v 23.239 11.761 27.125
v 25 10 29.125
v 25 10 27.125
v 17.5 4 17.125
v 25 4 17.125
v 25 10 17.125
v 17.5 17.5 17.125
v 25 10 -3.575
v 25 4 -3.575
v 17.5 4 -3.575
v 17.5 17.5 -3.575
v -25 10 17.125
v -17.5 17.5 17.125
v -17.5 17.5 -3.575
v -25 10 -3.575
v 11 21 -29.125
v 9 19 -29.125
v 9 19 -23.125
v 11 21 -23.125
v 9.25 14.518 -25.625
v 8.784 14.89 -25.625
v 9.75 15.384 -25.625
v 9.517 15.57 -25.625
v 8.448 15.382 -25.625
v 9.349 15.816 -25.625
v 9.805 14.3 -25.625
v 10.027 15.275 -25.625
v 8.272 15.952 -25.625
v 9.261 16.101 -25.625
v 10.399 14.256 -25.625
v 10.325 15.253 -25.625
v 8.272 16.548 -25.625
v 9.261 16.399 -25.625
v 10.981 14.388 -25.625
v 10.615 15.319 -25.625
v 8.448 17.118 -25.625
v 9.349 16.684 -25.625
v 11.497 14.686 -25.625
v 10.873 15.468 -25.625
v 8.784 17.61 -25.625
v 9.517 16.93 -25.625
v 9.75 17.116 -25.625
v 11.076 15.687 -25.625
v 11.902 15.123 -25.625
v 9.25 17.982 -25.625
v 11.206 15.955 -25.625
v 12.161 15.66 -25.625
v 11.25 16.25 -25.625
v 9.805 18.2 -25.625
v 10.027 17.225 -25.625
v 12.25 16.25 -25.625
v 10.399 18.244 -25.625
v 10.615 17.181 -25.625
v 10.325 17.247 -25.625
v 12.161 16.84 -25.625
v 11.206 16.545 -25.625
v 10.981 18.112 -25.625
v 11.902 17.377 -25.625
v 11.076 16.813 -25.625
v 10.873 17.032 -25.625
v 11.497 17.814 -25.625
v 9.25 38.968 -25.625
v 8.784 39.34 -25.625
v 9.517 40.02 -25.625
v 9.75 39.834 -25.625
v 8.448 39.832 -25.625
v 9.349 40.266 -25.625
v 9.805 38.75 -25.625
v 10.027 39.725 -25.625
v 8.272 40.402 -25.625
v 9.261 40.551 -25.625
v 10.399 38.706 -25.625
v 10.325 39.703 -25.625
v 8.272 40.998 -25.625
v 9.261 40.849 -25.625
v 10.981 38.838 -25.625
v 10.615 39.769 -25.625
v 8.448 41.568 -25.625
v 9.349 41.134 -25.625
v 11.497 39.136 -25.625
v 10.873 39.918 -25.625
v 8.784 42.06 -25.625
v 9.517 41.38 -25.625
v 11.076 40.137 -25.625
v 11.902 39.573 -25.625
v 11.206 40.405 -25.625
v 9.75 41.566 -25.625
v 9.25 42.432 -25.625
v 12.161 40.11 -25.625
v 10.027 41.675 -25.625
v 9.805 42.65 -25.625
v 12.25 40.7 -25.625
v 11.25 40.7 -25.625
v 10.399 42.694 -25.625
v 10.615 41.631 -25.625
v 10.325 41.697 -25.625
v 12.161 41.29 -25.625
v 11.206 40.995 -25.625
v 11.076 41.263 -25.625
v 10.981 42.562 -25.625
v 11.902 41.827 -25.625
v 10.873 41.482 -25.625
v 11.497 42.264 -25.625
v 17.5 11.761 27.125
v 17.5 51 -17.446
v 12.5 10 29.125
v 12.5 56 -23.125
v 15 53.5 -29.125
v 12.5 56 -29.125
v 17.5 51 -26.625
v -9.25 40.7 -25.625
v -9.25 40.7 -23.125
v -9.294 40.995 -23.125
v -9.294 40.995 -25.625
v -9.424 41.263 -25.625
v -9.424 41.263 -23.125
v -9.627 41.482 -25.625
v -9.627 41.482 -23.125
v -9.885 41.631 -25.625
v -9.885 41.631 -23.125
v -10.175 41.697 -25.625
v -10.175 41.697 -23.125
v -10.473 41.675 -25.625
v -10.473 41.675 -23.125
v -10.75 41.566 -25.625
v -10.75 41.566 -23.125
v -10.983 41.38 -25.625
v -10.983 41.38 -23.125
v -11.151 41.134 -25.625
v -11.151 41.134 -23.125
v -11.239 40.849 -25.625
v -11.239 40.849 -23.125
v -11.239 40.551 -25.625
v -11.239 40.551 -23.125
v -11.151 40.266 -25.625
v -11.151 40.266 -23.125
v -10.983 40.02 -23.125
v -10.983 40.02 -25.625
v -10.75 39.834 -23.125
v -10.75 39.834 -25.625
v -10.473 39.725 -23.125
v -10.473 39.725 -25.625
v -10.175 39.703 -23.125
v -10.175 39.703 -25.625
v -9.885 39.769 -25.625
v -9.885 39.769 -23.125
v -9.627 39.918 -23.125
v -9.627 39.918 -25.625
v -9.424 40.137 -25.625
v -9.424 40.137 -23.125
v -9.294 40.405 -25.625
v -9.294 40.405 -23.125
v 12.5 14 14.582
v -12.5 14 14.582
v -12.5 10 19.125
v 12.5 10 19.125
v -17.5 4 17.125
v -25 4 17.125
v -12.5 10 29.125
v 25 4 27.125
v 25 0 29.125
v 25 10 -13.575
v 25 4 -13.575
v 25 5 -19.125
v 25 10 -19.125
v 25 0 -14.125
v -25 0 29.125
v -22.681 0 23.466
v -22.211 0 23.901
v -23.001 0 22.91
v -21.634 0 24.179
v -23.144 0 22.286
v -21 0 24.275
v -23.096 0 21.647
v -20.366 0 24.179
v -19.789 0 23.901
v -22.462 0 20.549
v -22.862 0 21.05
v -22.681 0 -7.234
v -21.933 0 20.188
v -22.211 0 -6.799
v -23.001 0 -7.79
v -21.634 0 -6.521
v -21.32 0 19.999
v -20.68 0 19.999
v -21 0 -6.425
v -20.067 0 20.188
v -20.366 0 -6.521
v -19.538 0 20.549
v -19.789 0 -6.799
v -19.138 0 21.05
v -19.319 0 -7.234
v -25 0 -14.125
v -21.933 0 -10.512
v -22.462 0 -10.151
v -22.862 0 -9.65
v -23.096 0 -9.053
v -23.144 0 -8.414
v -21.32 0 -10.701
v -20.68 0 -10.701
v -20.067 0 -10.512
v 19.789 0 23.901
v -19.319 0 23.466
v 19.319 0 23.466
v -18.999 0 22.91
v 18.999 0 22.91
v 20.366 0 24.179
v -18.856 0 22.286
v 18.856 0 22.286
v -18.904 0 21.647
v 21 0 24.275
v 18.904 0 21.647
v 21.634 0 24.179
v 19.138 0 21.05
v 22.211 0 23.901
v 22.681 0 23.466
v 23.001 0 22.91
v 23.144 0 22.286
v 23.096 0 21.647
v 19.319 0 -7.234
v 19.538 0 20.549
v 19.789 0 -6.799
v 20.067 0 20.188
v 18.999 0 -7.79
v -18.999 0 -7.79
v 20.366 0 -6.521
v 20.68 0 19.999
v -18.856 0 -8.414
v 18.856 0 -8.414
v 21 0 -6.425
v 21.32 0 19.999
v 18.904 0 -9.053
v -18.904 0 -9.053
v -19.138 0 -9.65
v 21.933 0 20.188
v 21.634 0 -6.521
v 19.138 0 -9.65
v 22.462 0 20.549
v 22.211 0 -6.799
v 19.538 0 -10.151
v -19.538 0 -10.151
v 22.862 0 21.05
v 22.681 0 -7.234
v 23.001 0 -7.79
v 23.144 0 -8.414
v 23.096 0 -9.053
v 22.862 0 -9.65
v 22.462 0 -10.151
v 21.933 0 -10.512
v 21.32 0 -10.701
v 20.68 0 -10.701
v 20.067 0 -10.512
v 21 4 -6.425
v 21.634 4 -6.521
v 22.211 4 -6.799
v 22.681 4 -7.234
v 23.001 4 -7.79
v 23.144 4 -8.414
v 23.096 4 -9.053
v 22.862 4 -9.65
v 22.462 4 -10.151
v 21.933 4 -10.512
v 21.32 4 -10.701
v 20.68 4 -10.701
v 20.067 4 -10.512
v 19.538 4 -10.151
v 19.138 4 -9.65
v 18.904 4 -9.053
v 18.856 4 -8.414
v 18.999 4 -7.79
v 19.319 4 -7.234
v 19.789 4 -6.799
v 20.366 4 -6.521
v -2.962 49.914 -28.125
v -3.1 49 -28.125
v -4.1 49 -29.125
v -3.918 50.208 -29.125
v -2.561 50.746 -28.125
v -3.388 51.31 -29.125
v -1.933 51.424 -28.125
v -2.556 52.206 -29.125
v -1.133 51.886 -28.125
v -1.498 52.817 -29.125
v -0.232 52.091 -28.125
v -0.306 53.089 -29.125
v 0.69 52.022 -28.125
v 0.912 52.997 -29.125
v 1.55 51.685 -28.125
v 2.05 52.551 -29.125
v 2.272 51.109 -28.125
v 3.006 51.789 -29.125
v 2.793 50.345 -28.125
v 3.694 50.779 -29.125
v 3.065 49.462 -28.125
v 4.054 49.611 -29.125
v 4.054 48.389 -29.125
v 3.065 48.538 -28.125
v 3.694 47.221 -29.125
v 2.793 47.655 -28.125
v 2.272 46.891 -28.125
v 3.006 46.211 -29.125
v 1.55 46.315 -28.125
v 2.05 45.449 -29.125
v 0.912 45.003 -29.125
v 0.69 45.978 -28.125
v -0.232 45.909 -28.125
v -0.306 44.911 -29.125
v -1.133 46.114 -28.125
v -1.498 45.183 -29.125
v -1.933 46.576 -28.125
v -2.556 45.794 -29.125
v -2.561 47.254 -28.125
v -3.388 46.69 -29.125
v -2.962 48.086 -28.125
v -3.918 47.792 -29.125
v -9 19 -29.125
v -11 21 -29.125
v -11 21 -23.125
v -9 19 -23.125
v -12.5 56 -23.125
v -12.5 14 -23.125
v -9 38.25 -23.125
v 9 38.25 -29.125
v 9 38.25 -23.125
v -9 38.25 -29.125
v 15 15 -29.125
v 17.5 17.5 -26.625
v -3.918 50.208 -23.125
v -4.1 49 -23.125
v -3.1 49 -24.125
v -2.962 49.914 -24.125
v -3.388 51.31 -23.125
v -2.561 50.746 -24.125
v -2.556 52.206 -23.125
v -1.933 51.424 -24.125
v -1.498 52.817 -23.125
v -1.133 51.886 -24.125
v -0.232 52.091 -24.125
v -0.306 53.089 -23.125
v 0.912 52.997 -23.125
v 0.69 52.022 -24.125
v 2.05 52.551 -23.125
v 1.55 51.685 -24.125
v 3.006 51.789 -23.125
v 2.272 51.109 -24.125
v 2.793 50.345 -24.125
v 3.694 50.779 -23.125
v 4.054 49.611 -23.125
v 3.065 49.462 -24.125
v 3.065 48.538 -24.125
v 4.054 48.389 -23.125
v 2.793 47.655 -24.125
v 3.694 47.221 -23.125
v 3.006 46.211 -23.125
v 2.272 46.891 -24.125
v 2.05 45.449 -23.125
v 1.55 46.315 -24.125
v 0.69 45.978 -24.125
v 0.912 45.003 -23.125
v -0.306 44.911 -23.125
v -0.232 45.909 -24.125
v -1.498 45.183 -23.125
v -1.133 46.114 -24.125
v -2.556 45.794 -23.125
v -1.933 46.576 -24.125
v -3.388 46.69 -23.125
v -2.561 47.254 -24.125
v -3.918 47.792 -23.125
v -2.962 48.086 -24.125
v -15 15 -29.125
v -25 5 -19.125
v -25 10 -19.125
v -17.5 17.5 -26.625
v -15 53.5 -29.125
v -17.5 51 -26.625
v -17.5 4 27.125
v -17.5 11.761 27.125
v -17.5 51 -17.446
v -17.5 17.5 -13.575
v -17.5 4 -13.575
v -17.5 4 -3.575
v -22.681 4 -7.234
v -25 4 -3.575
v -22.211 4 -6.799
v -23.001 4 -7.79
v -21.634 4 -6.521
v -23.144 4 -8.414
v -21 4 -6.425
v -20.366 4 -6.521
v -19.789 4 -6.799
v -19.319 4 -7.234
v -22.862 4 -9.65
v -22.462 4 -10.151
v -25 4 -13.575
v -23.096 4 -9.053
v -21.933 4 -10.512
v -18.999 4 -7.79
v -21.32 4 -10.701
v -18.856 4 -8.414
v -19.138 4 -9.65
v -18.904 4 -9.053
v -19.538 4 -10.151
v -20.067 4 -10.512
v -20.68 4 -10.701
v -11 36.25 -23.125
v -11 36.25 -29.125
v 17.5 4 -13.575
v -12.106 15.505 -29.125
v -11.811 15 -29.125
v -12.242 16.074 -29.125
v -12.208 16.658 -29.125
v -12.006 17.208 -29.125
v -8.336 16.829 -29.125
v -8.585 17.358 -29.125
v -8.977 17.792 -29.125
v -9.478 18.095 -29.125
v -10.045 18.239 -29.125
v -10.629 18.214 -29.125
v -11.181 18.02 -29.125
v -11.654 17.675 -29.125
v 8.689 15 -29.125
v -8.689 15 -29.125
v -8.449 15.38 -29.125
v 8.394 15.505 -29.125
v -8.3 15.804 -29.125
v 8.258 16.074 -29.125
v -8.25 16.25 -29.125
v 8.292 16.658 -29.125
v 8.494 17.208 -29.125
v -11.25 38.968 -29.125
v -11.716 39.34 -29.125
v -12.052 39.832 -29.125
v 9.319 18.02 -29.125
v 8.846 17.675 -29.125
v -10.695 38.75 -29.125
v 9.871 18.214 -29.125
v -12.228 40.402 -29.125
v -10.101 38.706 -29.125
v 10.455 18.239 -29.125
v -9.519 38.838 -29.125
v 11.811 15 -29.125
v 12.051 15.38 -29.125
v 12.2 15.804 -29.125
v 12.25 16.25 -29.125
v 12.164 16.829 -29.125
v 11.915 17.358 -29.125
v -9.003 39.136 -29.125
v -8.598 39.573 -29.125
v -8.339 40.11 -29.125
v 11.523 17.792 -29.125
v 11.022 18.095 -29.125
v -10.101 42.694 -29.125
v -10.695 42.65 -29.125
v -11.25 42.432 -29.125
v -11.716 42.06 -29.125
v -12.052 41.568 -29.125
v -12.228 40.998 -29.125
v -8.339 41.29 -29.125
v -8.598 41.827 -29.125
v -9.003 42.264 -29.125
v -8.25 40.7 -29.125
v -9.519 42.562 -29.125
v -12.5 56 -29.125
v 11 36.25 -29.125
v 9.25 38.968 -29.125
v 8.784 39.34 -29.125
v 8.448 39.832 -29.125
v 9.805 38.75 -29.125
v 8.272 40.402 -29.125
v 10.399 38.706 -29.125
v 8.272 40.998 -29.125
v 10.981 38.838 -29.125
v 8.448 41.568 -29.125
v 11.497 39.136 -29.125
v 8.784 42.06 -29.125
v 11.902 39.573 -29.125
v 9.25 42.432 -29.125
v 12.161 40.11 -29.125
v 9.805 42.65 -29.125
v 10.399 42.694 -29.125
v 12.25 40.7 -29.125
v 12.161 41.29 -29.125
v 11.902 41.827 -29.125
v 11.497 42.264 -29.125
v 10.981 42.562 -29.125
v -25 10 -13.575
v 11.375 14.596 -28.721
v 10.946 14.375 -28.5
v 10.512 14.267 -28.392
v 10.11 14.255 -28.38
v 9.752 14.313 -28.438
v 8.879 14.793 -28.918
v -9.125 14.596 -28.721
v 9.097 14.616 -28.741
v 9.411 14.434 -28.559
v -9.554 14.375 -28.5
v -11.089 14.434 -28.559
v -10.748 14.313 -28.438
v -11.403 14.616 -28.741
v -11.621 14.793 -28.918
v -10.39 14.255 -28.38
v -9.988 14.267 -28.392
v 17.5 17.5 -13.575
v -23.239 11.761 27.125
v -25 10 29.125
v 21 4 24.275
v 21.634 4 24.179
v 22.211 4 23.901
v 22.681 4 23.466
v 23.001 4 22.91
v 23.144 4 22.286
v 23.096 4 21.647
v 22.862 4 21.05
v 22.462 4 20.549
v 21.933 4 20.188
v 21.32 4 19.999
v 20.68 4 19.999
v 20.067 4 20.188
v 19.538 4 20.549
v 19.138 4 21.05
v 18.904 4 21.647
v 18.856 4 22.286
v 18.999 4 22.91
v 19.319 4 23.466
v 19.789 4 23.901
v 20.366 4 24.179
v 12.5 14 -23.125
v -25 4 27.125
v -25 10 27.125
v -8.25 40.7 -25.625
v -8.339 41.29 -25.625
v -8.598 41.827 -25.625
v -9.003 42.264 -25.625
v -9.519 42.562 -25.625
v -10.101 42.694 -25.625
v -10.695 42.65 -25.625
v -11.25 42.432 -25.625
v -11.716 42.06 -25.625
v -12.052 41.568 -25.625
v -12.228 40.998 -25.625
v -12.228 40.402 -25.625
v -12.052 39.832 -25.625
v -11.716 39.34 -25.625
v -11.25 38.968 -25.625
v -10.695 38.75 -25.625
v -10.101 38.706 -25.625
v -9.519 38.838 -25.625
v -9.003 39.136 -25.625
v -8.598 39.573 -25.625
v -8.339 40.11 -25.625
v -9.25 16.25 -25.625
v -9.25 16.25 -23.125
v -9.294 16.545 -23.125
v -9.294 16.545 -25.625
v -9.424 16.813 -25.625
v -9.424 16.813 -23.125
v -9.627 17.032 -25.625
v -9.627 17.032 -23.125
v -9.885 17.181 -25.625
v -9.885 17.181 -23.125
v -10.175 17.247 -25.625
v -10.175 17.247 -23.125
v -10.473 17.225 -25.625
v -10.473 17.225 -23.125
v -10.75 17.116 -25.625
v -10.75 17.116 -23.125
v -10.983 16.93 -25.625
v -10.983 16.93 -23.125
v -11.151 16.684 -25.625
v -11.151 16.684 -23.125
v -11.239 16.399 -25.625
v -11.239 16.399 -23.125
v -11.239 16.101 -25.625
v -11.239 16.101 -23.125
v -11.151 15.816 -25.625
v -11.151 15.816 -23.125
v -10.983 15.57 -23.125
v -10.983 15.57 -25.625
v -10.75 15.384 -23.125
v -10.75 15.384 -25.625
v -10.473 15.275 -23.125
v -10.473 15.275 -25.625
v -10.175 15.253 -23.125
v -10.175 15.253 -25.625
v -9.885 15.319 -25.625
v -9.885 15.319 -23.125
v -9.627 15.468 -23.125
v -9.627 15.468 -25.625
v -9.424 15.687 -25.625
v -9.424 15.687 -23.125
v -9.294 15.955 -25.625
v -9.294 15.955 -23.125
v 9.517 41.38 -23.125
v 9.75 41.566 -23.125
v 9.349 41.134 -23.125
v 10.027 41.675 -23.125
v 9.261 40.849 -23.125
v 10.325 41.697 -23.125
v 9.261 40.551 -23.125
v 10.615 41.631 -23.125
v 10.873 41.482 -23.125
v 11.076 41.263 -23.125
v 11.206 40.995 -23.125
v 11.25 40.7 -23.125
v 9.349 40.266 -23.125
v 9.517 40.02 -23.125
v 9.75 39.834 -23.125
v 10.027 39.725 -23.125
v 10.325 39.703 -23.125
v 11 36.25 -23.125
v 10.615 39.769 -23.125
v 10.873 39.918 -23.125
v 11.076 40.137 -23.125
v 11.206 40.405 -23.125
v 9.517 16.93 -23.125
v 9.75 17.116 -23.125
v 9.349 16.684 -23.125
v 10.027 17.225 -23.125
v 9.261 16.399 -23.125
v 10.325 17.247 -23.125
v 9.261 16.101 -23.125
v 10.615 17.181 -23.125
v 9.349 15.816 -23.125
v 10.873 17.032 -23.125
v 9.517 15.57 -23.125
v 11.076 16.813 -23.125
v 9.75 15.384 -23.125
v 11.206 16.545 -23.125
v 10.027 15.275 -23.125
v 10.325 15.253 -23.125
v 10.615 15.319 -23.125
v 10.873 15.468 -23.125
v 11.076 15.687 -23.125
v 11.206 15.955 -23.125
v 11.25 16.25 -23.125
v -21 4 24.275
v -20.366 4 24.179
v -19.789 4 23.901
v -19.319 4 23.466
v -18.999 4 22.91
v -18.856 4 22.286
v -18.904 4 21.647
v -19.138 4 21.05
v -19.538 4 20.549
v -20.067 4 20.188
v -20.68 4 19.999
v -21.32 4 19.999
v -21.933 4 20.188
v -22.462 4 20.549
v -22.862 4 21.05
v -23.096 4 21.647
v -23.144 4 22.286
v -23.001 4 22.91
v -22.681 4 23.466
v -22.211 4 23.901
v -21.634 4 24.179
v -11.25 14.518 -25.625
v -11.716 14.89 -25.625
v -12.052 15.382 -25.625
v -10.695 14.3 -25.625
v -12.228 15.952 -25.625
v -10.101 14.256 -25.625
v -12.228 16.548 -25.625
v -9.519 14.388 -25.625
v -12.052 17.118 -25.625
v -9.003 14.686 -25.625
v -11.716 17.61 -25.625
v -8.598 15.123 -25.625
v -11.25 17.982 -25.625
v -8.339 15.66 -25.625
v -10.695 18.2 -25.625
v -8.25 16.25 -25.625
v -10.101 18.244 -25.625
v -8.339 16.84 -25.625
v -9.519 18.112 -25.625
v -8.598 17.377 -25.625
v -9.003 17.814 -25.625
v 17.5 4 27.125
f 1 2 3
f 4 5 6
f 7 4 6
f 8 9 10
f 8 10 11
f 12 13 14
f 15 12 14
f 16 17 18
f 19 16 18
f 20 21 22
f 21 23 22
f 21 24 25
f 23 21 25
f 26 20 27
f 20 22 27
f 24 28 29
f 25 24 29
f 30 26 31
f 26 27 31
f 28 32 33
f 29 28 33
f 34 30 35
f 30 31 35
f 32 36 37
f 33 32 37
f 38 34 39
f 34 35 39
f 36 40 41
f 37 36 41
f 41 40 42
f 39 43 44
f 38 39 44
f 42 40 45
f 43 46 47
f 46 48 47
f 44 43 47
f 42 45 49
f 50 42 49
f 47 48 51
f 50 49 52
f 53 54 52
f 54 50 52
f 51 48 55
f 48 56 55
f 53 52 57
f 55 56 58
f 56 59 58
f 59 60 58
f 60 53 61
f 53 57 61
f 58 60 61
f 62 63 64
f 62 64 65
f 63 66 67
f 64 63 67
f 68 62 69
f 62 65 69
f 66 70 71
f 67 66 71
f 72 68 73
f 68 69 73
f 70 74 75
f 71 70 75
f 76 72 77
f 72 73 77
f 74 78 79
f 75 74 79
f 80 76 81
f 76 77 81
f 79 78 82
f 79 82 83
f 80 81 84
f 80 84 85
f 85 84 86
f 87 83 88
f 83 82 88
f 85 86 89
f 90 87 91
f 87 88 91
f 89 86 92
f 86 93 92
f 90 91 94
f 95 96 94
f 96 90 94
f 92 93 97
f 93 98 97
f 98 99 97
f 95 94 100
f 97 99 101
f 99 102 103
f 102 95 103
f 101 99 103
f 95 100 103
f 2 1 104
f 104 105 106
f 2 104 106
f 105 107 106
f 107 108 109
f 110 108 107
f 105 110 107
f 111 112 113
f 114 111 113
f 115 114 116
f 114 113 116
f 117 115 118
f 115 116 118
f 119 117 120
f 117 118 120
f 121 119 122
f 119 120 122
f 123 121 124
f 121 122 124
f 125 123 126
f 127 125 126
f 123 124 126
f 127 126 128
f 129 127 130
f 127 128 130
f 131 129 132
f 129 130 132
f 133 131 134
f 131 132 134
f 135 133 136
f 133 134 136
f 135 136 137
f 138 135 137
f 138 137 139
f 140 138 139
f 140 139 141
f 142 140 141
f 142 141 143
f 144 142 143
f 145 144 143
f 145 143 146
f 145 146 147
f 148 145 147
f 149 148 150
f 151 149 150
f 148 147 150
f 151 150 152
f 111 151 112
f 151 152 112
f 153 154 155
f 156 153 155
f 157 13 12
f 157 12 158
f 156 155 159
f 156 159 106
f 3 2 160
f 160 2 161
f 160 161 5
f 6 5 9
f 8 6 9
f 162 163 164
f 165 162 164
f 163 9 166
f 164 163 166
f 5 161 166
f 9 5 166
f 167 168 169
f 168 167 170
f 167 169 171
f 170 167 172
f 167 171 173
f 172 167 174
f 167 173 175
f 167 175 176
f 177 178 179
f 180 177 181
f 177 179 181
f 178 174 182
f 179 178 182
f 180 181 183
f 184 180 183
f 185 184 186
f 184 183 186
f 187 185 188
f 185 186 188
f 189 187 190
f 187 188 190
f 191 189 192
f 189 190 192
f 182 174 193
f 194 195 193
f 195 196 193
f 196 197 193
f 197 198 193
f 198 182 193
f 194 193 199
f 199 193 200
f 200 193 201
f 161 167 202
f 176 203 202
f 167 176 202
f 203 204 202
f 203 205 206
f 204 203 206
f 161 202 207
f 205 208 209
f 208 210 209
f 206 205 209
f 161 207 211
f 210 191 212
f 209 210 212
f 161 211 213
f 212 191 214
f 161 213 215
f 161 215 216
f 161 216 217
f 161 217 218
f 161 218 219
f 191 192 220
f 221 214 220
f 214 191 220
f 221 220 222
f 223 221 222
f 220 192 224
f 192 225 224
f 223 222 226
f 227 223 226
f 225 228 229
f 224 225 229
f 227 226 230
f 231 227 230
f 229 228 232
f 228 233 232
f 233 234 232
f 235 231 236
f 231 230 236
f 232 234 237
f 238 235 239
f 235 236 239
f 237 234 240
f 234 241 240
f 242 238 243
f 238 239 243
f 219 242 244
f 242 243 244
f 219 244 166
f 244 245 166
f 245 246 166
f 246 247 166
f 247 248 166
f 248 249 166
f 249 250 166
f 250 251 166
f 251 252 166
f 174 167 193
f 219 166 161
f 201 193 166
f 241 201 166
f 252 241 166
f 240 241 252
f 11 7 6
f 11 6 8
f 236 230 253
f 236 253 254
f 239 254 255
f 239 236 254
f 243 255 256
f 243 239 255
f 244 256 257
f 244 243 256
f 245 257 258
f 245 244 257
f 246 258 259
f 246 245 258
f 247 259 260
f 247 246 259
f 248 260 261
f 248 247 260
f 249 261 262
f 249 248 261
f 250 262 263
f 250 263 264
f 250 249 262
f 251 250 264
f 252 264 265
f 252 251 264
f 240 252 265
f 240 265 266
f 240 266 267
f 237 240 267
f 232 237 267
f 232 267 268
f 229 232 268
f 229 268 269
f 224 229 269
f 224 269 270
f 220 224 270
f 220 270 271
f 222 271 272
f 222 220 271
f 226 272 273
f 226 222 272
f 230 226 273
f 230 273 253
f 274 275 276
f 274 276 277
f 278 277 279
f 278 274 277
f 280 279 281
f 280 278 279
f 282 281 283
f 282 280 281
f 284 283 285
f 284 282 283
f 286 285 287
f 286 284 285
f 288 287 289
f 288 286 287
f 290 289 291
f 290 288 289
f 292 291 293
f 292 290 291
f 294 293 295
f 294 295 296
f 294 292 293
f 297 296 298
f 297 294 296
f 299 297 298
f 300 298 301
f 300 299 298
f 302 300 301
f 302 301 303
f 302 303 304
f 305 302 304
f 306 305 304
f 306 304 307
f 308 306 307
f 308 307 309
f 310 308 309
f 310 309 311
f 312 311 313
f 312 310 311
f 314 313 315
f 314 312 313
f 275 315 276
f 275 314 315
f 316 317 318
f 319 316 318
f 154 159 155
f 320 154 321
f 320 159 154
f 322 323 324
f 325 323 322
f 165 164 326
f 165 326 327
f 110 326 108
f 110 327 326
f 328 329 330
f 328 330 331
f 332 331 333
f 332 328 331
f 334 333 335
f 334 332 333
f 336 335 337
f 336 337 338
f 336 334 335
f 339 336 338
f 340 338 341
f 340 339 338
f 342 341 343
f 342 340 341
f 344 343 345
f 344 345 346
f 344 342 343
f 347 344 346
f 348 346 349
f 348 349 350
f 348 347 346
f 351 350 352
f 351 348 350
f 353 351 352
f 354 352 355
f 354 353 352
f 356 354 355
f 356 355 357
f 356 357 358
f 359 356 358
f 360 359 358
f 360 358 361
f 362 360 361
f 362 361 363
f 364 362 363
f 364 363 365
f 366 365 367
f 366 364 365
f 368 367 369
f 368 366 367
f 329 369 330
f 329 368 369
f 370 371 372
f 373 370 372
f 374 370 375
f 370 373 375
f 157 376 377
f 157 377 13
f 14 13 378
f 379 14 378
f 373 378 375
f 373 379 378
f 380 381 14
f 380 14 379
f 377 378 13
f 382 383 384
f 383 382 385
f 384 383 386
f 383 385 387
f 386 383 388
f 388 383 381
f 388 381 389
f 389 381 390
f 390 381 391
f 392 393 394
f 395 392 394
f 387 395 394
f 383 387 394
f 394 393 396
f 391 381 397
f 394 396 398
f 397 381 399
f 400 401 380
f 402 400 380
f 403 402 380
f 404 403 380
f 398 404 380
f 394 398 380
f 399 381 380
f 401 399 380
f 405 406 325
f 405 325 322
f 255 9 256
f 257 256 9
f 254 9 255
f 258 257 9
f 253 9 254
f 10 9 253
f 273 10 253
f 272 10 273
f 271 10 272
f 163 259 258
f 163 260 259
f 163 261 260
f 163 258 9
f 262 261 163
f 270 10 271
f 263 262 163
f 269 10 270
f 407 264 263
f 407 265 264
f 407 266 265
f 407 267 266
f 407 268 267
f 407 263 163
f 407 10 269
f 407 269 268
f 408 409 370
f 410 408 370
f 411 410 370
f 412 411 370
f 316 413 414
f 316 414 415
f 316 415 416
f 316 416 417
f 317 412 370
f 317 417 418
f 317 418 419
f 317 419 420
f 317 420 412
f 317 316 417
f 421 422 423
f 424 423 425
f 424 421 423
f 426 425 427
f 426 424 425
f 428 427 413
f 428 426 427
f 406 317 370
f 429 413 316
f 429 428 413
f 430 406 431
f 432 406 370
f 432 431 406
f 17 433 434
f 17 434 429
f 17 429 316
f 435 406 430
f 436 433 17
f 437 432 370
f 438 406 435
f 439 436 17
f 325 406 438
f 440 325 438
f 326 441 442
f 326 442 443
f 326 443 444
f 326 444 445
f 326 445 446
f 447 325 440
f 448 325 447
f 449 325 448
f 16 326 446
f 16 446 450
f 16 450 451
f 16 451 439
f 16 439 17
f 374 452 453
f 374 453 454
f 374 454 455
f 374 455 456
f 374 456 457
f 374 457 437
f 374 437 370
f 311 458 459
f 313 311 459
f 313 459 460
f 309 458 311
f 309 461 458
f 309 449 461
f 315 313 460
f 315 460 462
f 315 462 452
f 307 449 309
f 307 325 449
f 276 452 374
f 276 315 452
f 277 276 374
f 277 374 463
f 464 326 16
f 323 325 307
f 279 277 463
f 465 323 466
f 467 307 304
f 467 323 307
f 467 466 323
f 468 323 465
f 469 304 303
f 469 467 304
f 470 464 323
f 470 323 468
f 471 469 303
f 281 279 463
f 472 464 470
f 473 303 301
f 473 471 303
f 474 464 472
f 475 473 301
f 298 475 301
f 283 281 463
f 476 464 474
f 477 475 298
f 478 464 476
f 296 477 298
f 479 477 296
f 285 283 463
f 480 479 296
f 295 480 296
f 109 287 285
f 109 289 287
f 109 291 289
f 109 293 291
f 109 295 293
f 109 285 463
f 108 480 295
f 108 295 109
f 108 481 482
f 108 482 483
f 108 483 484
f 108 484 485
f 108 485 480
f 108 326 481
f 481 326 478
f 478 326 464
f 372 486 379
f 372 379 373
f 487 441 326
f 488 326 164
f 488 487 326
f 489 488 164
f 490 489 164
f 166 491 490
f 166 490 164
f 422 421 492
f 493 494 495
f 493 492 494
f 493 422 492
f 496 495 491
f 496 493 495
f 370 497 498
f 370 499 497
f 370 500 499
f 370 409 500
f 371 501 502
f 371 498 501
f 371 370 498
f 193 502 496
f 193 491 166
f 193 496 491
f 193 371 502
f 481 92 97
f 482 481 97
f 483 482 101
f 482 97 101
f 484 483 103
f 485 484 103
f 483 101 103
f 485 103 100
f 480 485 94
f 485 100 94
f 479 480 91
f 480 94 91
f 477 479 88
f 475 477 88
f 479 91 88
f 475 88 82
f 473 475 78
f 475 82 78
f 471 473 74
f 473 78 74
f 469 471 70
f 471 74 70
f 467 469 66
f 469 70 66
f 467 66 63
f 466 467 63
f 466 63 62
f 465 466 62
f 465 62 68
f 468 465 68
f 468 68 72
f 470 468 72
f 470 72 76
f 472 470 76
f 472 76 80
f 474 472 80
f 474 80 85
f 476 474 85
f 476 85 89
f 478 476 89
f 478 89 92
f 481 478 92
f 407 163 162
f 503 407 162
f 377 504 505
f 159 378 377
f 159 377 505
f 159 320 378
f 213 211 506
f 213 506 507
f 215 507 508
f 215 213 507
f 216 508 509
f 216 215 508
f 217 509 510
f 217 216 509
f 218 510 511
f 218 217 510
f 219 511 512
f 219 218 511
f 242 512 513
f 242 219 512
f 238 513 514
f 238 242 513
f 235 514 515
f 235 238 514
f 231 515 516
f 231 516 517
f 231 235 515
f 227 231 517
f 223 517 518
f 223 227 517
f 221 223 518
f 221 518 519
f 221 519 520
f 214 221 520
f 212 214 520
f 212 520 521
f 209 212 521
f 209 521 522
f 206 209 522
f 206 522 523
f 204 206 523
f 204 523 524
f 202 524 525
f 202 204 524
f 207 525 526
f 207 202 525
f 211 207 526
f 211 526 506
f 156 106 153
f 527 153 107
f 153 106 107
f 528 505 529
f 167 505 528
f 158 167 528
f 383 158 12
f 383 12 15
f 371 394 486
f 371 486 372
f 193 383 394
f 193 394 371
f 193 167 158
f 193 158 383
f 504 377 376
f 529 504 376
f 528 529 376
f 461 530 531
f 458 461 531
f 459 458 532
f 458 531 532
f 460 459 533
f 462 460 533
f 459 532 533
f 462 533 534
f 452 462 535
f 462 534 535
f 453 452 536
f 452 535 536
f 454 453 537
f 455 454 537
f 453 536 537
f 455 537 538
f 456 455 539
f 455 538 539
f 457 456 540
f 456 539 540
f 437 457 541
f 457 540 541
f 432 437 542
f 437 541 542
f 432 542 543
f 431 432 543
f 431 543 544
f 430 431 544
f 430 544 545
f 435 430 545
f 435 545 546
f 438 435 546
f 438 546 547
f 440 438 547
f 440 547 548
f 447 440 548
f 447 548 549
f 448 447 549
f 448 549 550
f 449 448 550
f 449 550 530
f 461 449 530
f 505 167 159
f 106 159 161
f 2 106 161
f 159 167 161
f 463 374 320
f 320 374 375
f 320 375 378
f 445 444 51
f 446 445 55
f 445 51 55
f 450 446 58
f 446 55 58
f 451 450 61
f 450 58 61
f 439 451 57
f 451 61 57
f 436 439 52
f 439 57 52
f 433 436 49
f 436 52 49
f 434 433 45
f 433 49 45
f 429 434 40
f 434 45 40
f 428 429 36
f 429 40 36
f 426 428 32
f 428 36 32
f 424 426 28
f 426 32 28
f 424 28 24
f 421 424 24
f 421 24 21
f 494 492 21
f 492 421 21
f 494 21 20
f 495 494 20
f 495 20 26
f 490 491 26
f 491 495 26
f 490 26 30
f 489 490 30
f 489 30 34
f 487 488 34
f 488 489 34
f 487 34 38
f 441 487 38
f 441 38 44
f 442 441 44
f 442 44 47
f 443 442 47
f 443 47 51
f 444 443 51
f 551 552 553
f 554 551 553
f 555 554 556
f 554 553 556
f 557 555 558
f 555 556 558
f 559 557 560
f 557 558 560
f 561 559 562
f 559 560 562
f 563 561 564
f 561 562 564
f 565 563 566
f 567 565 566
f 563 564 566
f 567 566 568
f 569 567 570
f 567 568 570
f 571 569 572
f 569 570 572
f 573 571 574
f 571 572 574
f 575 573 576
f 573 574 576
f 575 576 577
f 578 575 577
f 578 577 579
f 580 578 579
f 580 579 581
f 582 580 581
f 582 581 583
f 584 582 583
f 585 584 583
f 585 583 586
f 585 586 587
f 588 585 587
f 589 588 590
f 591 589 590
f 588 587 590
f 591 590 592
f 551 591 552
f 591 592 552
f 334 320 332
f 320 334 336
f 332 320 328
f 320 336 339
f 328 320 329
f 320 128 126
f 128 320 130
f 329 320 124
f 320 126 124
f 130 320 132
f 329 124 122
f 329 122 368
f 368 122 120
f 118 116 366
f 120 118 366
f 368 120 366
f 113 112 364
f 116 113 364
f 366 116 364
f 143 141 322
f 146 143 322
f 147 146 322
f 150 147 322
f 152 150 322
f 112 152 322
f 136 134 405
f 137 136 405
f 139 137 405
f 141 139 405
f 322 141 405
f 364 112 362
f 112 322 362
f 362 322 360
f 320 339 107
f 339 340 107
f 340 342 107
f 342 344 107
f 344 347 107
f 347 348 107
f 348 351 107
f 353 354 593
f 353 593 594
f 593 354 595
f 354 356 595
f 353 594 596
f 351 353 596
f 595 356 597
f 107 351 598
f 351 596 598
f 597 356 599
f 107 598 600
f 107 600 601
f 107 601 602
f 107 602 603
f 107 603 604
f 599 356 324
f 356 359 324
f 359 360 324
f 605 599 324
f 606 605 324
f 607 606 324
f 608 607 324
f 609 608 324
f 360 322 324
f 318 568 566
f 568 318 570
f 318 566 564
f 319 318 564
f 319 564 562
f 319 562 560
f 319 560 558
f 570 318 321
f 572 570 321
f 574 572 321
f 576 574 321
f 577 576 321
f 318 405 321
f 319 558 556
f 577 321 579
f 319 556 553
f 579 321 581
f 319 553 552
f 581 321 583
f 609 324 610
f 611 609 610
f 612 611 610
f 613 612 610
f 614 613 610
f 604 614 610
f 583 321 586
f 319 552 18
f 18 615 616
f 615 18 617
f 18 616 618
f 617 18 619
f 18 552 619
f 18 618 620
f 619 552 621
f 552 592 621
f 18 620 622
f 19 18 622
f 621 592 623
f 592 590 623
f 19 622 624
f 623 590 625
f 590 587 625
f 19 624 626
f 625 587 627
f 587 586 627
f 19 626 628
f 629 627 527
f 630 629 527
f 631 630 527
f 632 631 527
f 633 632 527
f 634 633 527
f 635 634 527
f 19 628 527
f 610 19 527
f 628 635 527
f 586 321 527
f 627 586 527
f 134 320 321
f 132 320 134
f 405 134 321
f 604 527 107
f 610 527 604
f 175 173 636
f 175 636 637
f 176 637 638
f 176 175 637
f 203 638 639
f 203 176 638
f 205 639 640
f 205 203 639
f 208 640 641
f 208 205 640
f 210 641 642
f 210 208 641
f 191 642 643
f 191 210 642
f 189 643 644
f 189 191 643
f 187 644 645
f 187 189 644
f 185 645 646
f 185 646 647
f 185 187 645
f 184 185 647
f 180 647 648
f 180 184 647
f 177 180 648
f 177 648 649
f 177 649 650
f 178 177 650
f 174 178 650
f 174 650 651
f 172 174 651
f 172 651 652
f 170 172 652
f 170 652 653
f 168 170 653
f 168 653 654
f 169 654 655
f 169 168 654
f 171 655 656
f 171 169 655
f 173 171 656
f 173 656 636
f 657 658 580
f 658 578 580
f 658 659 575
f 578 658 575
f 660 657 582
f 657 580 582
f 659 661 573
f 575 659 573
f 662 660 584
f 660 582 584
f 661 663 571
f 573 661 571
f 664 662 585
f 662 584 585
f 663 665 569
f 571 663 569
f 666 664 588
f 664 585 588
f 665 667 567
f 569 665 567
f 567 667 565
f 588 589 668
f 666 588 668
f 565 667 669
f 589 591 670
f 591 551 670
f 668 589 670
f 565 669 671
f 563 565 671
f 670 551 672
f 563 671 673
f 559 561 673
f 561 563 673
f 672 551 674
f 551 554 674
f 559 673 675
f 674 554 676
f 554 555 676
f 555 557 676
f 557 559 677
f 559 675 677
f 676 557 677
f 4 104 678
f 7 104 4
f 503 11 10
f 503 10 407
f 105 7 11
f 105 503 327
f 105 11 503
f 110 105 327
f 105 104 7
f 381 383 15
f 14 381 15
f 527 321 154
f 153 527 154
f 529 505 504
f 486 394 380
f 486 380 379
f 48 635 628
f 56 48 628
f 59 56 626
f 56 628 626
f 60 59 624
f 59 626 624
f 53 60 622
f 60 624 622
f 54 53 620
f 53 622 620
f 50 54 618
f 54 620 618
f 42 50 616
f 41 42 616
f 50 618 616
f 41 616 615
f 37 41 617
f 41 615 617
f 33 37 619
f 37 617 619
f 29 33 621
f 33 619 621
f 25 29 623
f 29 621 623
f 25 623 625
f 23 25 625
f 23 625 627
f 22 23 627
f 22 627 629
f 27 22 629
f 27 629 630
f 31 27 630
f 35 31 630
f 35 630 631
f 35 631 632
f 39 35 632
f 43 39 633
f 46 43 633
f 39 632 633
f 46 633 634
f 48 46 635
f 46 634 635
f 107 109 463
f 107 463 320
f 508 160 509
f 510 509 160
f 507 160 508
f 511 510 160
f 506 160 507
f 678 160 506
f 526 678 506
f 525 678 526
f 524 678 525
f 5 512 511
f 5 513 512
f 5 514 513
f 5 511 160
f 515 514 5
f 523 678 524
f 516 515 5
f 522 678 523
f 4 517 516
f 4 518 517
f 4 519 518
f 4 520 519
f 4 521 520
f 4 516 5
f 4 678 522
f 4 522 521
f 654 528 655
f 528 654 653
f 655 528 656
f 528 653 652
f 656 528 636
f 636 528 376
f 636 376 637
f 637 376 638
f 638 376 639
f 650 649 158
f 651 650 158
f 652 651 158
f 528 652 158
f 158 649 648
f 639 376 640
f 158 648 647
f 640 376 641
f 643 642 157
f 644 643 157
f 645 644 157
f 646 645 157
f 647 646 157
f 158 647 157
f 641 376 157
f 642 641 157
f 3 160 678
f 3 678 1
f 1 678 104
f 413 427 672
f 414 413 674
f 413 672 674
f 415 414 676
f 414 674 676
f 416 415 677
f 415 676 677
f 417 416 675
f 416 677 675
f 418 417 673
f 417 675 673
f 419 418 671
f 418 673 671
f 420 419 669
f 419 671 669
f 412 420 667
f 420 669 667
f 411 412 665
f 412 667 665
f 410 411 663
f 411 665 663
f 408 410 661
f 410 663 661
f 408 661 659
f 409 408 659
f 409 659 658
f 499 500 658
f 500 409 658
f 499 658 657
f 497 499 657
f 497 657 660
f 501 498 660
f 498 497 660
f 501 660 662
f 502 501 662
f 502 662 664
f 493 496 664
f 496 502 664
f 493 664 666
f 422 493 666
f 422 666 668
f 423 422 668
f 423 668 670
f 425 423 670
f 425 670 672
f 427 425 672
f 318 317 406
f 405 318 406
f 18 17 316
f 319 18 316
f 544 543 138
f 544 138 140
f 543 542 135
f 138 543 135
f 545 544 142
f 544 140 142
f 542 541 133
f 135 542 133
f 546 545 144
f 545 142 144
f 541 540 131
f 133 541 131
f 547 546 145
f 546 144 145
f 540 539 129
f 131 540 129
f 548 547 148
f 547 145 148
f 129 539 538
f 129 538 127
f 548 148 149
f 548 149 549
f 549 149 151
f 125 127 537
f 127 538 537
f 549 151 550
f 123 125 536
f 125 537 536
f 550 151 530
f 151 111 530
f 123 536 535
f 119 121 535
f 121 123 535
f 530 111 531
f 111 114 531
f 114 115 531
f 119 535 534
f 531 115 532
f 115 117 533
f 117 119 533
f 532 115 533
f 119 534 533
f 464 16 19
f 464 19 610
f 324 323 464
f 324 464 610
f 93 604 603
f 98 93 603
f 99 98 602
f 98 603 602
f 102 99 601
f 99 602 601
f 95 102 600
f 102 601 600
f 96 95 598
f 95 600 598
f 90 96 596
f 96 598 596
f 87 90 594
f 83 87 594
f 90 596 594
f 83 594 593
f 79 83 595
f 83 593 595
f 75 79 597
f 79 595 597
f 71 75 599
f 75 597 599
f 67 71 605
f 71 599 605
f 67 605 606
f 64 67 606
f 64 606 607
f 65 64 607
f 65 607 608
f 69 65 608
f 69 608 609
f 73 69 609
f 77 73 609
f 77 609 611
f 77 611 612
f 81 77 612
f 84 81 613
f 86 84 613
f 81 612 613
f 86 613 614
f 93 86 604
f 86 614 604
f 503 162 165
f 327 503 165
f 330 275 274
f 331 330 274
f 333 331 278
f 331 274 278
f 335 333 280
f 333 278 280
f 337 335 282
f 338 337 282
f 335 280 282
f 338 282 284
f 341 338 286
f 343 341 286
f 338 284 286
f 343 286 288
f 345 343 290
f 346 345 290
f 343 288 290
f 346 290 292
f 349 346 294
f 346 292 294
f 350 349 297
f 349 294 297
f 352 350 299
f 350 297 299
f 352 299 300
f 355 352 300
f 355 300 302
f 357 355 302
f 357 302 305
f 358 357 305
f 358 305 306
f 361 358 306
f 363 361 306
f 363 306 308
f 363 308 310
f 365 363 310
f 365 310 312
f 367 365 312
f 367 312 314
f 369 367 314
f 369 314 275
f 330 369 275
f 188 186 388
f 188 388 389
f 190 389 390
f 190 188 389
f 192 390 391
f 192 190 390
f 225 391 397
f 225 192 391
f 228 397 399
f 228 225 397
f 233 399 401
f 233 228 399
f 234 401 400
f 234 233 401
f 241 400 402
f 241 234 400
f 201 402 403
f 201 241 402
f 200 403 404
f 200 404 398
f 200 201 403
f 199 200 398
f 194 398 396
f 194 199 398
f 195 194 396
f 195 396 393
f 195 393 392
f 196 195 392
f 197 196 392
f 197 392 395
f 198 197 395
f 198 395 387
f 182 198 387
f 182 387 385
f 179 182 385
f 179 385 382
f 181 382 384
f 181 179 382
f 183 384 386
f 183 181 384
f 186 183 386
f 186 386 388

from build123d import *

# Parameters (mm, degrees)
SKETCH1_W               = 50
SKETCH1_H               = 58.25
BOSS_EXTRUDE1_DEPTH     = 10
SKETCH2_R               = 2.15
CUT_EXTRUDE1_DEPTH      = 4
SKETCH5_W               = 25
SKETCH5_H               = 6
BOSS_EXTRUDE3_DEPTH     = 46
CUT_EXTRUDE3_REACH      = 86.582
SKETCH6_W               = 22
SKETCH6_H               = 19.25
SKETCH7_R               = 1
CUT_EXTRUDE4_DEPTH      = 2.5
CUT_EXTRUDE5_REACH      = 84.21
SKETCH8_R               = 2
BOSS_EXTRUDE4_DEPTH     = 5
CHAMFER1_SIZE           = 7.5
CHAMFER2_SIZE           = 10
CHAMFER4_SIZE           = 15
CHAMFER5_SIZE           = 5
CHAMFER7_SIZE           = 2
CUT_EXTRUDE6_REACH      = 86.582
SKETCH10_R              = 3.1
CHAMFER8_SIZE           = 1
BOSS_EXTRUDE5_REACH     = 75.42
CUT_EXTRUDE12_REACH     = 78.095
SKETCH17_W              = 10
SKETCH17_H              = 13.5
LPATTERN1_COUNT         = 2
LPATTERN1_PITCH         = 30.7
MIRROR3_COPY_1_REACH    = 78.095
MIRROR3_COPY_1_SKETCH_W = 10
MIRROR3_COPY_1_SKETCH_H = 13.5


# Some blends are built 0.0001 mm under size
with BuildPart() as part:
    # Sketch1 → Boss-Extrude1 (new body)
    with BuildSketch(Plane(origin=(0, 0, 0), x_dir=(1, 0, 0), z_dir=(0, 1, 0))):
        Rectangle(SKETCH1_W, SKETCH1_H)
    extrude(amount=BOSS_EXTRUDE1_DEPTH)

    # Sketch2 → Cut-Extrude1 (cut)
    with BuildSketch(Plane(origin=(0, 0, 0), x_dir=(1, 0, 0), z_dir=(0, 1, 0))):
        with Locations(Location((-21, 8.575, 0), (0, 0, 270))):
            Circle(SKETCH2_R)
        with Locations(Location((-21, -22.125, 0), (0, 0, 270))):
            Circle(SKETCH2_R)
        with Locations(Location((21, 8.575, 0), (0, 0, 270))):
            Circle(SKETCH2_R)
        with Locations(Location((21, -22.125, 0), (0, 0, 270))):
            Circle(SKETCH2_R)
    extrude(amount=CUT_EXTRUDE1_DEPTH, mode=Mode.SUBTRACT)

    # Sketch5 → Boss-Extrude3 (add)
    with BuildSketch(Plane(origin=(0, 10, 0), x_dir=(1, 0, 0), z_dir=(0, 1, 0))):
        with Locations((0, 26.125)):
            Rectangle(SKETCH5_W, SKETCH5_H)
    extrude(amount=BOSS_EXTRUDE3_DEPTH)

    # Sketch6 → Cut-Extrude3 (cut, up to next)
    with BuildSketch(Plane(origin=(0, 0, -29.125), x_dir=(-1, 0, 0), z_dir=(0, 0, -1)), mode=Mode.PRIVATE) as cut_extrude3_sk1:
        with Locations((0, 28.625)):
            Rectangle(SKETCH6_W, SKETCH6_H)
    cut_extrude3_tool1 = extrude(cut_extrude3_sk1.sketch, amount=-CUT_EXTRUDE3_REACH, mode=Mode.PRIVATE) & part.part
    add(cut_extrude3_tool1.solids().sort_by_distance((0, 28.625, -29.125))[0], mode=Mode.SUBTRACT)

    # Sketch7 → Cut-Extrude4 (cut)
    with BuildSketch(Plane.XY.offset(-23.125)):
        with Locations((10.25, 16.25)):
            Circle(SKETCH7_R)
        with Locations((-10.25, 16.25)):
            Circle(SKETCH7_R)
        with Locations((-10.25, 40.7)):
            Circle(SKETCH7_R)
        with Locations((10.25, 40.7)):
            Circle(SKETCH7_R)
    extrude(amount=-CUT_EXTRUDE4_DEPTH, mode=Mode.SUBTRACT)

    # Sketch8 → Cut-Extrude5 (cut, up to next)
    with BuildSketch(Plane.XY.offset(-25.625), mode=Mode.PRIVATE) as cut_extrude5_sk1:
        with Locations((-10.25, 40.7)):
            Circle(SKETCH8_R)
    cut_extrude5_tool1 = extrude(cut_extrude5_sk1.sketch, amount=-CUT_EXTRUDE5_REACH, mode=Mode.PRIVATE) & part.part
    # Sketch8 → Cut-Extrude5 (cut, up to next)
    with BuildSketch(Plane.XY.offset(-25.625), mode=Mode.PRIVATE) as cut_extrude5_sk2:
        with Locations((10.25, 40.7)):
            Circle(SKETCH8_R)
    cut_extrude5_tool2 = extrude(cut_extrude5_sk2.sketch, amount=-CUT_EXTRUDE5_REACH, mode=Mode.PRIVATE) & part.part
    # Sketch8 → Cut-Extrude5 (cut, up to next)
    with BuildSketch(Plane.XY.offset(-25.625), mode=Mode.PRIVATE) as cut_extrude5_sk3:
        with Locations((10.25, 16.25)):
            Circle(SKETCH8_R)
    cut_extrude5_tool3 = extrude(cut_extrude5_sk3.sketch, amount=-CUT_EXTRUDE5_REACH, mode=Mode.PRIVATE) & part.part
    # Sketch8 → Cut-Extrude5 (cut, up to next)
    with BuildSketch(Plane.XY.offset(-25.625), mode=Mode.PRIVATE) as cut_extrude5_sk4:
        with Locations((-10.25, 16.25)):
            Circle(SKETCH8_R)
    cut_extrude5_tool4 = extrude(cut_extrude5_sk4.sketch, amount=-CUT_EXTRUDE5_REACH, mode=Mode.PRIVATE) & part.part
    add(cut_extrude5_tool1.solids().sort_by_distance((-10.25, 40.7, -25.625))[0], mode=Mode.SUBTRACT)
    add(cut_extrude5_tool2.solids().sort_by_distance((10.25, 40.7, -25.625))[0], mode=Mode.SUBTRACT)
    add(cut_extrude5_tool3.solids().sort_by_distance((10.25, 16.25, -25.625))[0], mode=Mode.SUBTRACT)
    add(cut_extrude5_tool4.solids().sort_by_distance((-10.25, 16.25, -25.625))[0], mode=Mode.SUBTRACT)

    # Sketch9 → Boss-Extrude4 (add)
    with BuildSketch(Plane(origin=(12.5, 0, 0), x_dir=(0, 0, -1), z_dir=(1, 0, 0))):
        Polygon((29.125, 56), (23.125, 56), (-29.125, 10), (29.125, 10), align=None)
    boss_extrude4 = extrude(amount=BOSS_EXTRUDE4_DEPTH)

    # Mirror1: Boss-Extrude4 across plane
    add(boss_extrude4.mirror(Plane(origin=(0, 0, 0), x_dir=(0, 0, 1), z_dir=(1, 0, 0))))

    # Chamfer1
    chamfer1_edges = [part.edges().sort_by_distance(p)[0] for p in [
        (17.5, 10, 0),
        (-17.5, 10, 0),
    ]]
    chamfer(chamfer1_edges, length=CHAMFER1_SIZE - 0.0001)  # a hair under: the kernel refuses the full size

    # Chamfer2
    chamfer2_edges = [part.edges().sort_by_distance(p)[0] for p in [
        (-25, 5, -29.125),
        (25, 5, -29.125),
    ]]
    chamfer(chamfer2_edges, length=CHAMFER2_SIZE)

    # Chamfer4
    # the kernel refuses this chamfer: 15 mm, written as the material it takes off along each edge
    with BuildSketch(Plane(origin=(-53.575244819, 0, -29.125), x_dir=(0, 0.9996219169112968, -0.02749587661058632), z_dir=(1, 0, 0))) as chamfer4_piece_1:
        Polygon((CHAMFER4_SIZE * 0.999621916911, CHAMFER4_SIZE * 0.0274958766106), (-CHAMFER4_SIZE * 0.0274958766106, CHAMFER4_SIZE * 0.999621916911), (0, 0), align=None)
    extrude(amount=107.150489639, mode=Mode.SUBTRACT)

    # Chamfer5
    chamfer5_edges = [part.edges().sort_by_distance(p)[0] for p in [
        (17.5, 56, -24.875),
        (-17.5, 56, -24.875),
    ]]
    chamfer(chamfer5_edges, length=CHAMFER5_SIZE)

    # Chamfer7
    chamfer7_edges = [part.edges().sort_by_distance(p)[0] for p in [
        (-11, 38.25, -26.125),
        (-11, 19, -26.125),
        (11, 19, -26.125),
        (11, 38.25, -26.125),
    ]]
    chamfer(chamfer7_edges, length=CHAMFER7_SIZE)

    # Sketch10 → Cut-Extrude6 (cut, up to next)
    with BuildSketch(Plane(origin=(0, 0, -29.125), x_dir=(-1, 0, 0), z_dir=(0, 0, -1)), mode=Mode.PRIVATE) as cut_extrude6_sk1:
        with Locations((0, 49)):
            Circle(SKETCH10_R)
    cut_extrude6_tool1 = extrude(cut_extrude6_sk1.sketch, amount=-CUT_EXTRUDE6_REACH, mode=Mode.PRIVATE) & part.part
    add(cut_extrude6_tool1.solids().sort_by_distance((0, 49, -29.125))[0], mode=Mode.SUBTRACT)

    # Chamfer8
    chamfer8_edges = [part.edges().sort_by_distance(p)[0] for p in [
        (3.1, 49, -29.125),
        (3.1, 49, -23.125),
    ]]
    chamfer(chamfer8_edges, length=CHAMFER8_SIZE)

    # Sketch11 → Boss-Extrude5 (add, up to next)
    with BuildSketch(Plane(origin=(-12.5, 0, 0), x_dir=(0, 0, -1), z_dir=(1, 0, 0)), mode=Mode.PRIVATE) as boss_extrude5_sk1:
        Polygon((-19.125, 10), (23.125, 10), (23.125, 14), (-14.581521739, 14), align=None)
    boss_extrude5_tool1 = extrude(boss_extrude5_sk1.sketch, amount=BOSS_EXTRUDE5_REACH, mode=Mode.PRIVATE) - part.part
    add(boss_extrude5_tool1.solids().sort_by_distance((-12.5, 11.962117, -3.114355))[0])

    # Sketch17 → Cut-Extrude12 (cut, up to next)
    with BuildSketch(Plane(origin=(17.5, 0, 0), x_dir=(0, 0, -1), z_dir=(1, 0, 0)), mode=Mode.PRIVATE) as cut_extrude12_sk1:
        with Locations((8.575, 10.75)):
            Rectangle(SKETCH17_W, SKETCH17_H)
    cut_extrude12_tool1 = extrude(cut_extrude12_sk1.sketch, amount=CUT_EXTRUDE12_REACH, mode=Mode.PRIVATE) & part.part
    cut_extrude12 = cut_extrude12_tool1.solids().sort_by_distance((17.5, 10.75, -8.575))[0]
    add(cut_extrude12, mode=Mode.SUBTRACT)

    # LPattern1: Cut-Extrude12 ×2
    with Locations(*[(0, 0, i * LPATTERN1_PITCH) for i in range(1, LPATTERN1_COUNT)]):
        add(cut_extrude12, mode=Mode.SUBTRACT)

    # Mirror3: Cut-Extrude12 across plane
    add(cut_extrude12.mirror(Plane(origin=(0, 0, 0), x_dir=(0, 0, 1), z_dir=(1, 0, 0))), mode=Mode.SUBTRACT)

    # Mirror3 copy 1 sketch → Mirror3 copy 1 (cut, up to next)
    with BuildSketch(Plane(origin=(-17.5, 0, 30.7), x_dir=(0, 0, -1), z_dir=(-1, 0, 0)), mode=Mode.PRIVATE) as mirror3_copy_1_sk1:
        with Locations((8.575, -10.75)):
            Rectangle(MIRROR3_COPY_1_SKETCH_W, MIRROR3_COPY_1_SKETCH_H)
    mirror3_copy_1_tool1 = extrude(mirror3_copy_1_sk1.sketch, amount=MIRROR3_COPY_1_REACH, mode=Mode.PRIVATE) & part.part
    add(mirror3_copy_1_tool1.solids().sort_by_distance((-17.5, 10.75, 22.125))[0], mode=Mode.SUBTRACT)


solid = part.part
